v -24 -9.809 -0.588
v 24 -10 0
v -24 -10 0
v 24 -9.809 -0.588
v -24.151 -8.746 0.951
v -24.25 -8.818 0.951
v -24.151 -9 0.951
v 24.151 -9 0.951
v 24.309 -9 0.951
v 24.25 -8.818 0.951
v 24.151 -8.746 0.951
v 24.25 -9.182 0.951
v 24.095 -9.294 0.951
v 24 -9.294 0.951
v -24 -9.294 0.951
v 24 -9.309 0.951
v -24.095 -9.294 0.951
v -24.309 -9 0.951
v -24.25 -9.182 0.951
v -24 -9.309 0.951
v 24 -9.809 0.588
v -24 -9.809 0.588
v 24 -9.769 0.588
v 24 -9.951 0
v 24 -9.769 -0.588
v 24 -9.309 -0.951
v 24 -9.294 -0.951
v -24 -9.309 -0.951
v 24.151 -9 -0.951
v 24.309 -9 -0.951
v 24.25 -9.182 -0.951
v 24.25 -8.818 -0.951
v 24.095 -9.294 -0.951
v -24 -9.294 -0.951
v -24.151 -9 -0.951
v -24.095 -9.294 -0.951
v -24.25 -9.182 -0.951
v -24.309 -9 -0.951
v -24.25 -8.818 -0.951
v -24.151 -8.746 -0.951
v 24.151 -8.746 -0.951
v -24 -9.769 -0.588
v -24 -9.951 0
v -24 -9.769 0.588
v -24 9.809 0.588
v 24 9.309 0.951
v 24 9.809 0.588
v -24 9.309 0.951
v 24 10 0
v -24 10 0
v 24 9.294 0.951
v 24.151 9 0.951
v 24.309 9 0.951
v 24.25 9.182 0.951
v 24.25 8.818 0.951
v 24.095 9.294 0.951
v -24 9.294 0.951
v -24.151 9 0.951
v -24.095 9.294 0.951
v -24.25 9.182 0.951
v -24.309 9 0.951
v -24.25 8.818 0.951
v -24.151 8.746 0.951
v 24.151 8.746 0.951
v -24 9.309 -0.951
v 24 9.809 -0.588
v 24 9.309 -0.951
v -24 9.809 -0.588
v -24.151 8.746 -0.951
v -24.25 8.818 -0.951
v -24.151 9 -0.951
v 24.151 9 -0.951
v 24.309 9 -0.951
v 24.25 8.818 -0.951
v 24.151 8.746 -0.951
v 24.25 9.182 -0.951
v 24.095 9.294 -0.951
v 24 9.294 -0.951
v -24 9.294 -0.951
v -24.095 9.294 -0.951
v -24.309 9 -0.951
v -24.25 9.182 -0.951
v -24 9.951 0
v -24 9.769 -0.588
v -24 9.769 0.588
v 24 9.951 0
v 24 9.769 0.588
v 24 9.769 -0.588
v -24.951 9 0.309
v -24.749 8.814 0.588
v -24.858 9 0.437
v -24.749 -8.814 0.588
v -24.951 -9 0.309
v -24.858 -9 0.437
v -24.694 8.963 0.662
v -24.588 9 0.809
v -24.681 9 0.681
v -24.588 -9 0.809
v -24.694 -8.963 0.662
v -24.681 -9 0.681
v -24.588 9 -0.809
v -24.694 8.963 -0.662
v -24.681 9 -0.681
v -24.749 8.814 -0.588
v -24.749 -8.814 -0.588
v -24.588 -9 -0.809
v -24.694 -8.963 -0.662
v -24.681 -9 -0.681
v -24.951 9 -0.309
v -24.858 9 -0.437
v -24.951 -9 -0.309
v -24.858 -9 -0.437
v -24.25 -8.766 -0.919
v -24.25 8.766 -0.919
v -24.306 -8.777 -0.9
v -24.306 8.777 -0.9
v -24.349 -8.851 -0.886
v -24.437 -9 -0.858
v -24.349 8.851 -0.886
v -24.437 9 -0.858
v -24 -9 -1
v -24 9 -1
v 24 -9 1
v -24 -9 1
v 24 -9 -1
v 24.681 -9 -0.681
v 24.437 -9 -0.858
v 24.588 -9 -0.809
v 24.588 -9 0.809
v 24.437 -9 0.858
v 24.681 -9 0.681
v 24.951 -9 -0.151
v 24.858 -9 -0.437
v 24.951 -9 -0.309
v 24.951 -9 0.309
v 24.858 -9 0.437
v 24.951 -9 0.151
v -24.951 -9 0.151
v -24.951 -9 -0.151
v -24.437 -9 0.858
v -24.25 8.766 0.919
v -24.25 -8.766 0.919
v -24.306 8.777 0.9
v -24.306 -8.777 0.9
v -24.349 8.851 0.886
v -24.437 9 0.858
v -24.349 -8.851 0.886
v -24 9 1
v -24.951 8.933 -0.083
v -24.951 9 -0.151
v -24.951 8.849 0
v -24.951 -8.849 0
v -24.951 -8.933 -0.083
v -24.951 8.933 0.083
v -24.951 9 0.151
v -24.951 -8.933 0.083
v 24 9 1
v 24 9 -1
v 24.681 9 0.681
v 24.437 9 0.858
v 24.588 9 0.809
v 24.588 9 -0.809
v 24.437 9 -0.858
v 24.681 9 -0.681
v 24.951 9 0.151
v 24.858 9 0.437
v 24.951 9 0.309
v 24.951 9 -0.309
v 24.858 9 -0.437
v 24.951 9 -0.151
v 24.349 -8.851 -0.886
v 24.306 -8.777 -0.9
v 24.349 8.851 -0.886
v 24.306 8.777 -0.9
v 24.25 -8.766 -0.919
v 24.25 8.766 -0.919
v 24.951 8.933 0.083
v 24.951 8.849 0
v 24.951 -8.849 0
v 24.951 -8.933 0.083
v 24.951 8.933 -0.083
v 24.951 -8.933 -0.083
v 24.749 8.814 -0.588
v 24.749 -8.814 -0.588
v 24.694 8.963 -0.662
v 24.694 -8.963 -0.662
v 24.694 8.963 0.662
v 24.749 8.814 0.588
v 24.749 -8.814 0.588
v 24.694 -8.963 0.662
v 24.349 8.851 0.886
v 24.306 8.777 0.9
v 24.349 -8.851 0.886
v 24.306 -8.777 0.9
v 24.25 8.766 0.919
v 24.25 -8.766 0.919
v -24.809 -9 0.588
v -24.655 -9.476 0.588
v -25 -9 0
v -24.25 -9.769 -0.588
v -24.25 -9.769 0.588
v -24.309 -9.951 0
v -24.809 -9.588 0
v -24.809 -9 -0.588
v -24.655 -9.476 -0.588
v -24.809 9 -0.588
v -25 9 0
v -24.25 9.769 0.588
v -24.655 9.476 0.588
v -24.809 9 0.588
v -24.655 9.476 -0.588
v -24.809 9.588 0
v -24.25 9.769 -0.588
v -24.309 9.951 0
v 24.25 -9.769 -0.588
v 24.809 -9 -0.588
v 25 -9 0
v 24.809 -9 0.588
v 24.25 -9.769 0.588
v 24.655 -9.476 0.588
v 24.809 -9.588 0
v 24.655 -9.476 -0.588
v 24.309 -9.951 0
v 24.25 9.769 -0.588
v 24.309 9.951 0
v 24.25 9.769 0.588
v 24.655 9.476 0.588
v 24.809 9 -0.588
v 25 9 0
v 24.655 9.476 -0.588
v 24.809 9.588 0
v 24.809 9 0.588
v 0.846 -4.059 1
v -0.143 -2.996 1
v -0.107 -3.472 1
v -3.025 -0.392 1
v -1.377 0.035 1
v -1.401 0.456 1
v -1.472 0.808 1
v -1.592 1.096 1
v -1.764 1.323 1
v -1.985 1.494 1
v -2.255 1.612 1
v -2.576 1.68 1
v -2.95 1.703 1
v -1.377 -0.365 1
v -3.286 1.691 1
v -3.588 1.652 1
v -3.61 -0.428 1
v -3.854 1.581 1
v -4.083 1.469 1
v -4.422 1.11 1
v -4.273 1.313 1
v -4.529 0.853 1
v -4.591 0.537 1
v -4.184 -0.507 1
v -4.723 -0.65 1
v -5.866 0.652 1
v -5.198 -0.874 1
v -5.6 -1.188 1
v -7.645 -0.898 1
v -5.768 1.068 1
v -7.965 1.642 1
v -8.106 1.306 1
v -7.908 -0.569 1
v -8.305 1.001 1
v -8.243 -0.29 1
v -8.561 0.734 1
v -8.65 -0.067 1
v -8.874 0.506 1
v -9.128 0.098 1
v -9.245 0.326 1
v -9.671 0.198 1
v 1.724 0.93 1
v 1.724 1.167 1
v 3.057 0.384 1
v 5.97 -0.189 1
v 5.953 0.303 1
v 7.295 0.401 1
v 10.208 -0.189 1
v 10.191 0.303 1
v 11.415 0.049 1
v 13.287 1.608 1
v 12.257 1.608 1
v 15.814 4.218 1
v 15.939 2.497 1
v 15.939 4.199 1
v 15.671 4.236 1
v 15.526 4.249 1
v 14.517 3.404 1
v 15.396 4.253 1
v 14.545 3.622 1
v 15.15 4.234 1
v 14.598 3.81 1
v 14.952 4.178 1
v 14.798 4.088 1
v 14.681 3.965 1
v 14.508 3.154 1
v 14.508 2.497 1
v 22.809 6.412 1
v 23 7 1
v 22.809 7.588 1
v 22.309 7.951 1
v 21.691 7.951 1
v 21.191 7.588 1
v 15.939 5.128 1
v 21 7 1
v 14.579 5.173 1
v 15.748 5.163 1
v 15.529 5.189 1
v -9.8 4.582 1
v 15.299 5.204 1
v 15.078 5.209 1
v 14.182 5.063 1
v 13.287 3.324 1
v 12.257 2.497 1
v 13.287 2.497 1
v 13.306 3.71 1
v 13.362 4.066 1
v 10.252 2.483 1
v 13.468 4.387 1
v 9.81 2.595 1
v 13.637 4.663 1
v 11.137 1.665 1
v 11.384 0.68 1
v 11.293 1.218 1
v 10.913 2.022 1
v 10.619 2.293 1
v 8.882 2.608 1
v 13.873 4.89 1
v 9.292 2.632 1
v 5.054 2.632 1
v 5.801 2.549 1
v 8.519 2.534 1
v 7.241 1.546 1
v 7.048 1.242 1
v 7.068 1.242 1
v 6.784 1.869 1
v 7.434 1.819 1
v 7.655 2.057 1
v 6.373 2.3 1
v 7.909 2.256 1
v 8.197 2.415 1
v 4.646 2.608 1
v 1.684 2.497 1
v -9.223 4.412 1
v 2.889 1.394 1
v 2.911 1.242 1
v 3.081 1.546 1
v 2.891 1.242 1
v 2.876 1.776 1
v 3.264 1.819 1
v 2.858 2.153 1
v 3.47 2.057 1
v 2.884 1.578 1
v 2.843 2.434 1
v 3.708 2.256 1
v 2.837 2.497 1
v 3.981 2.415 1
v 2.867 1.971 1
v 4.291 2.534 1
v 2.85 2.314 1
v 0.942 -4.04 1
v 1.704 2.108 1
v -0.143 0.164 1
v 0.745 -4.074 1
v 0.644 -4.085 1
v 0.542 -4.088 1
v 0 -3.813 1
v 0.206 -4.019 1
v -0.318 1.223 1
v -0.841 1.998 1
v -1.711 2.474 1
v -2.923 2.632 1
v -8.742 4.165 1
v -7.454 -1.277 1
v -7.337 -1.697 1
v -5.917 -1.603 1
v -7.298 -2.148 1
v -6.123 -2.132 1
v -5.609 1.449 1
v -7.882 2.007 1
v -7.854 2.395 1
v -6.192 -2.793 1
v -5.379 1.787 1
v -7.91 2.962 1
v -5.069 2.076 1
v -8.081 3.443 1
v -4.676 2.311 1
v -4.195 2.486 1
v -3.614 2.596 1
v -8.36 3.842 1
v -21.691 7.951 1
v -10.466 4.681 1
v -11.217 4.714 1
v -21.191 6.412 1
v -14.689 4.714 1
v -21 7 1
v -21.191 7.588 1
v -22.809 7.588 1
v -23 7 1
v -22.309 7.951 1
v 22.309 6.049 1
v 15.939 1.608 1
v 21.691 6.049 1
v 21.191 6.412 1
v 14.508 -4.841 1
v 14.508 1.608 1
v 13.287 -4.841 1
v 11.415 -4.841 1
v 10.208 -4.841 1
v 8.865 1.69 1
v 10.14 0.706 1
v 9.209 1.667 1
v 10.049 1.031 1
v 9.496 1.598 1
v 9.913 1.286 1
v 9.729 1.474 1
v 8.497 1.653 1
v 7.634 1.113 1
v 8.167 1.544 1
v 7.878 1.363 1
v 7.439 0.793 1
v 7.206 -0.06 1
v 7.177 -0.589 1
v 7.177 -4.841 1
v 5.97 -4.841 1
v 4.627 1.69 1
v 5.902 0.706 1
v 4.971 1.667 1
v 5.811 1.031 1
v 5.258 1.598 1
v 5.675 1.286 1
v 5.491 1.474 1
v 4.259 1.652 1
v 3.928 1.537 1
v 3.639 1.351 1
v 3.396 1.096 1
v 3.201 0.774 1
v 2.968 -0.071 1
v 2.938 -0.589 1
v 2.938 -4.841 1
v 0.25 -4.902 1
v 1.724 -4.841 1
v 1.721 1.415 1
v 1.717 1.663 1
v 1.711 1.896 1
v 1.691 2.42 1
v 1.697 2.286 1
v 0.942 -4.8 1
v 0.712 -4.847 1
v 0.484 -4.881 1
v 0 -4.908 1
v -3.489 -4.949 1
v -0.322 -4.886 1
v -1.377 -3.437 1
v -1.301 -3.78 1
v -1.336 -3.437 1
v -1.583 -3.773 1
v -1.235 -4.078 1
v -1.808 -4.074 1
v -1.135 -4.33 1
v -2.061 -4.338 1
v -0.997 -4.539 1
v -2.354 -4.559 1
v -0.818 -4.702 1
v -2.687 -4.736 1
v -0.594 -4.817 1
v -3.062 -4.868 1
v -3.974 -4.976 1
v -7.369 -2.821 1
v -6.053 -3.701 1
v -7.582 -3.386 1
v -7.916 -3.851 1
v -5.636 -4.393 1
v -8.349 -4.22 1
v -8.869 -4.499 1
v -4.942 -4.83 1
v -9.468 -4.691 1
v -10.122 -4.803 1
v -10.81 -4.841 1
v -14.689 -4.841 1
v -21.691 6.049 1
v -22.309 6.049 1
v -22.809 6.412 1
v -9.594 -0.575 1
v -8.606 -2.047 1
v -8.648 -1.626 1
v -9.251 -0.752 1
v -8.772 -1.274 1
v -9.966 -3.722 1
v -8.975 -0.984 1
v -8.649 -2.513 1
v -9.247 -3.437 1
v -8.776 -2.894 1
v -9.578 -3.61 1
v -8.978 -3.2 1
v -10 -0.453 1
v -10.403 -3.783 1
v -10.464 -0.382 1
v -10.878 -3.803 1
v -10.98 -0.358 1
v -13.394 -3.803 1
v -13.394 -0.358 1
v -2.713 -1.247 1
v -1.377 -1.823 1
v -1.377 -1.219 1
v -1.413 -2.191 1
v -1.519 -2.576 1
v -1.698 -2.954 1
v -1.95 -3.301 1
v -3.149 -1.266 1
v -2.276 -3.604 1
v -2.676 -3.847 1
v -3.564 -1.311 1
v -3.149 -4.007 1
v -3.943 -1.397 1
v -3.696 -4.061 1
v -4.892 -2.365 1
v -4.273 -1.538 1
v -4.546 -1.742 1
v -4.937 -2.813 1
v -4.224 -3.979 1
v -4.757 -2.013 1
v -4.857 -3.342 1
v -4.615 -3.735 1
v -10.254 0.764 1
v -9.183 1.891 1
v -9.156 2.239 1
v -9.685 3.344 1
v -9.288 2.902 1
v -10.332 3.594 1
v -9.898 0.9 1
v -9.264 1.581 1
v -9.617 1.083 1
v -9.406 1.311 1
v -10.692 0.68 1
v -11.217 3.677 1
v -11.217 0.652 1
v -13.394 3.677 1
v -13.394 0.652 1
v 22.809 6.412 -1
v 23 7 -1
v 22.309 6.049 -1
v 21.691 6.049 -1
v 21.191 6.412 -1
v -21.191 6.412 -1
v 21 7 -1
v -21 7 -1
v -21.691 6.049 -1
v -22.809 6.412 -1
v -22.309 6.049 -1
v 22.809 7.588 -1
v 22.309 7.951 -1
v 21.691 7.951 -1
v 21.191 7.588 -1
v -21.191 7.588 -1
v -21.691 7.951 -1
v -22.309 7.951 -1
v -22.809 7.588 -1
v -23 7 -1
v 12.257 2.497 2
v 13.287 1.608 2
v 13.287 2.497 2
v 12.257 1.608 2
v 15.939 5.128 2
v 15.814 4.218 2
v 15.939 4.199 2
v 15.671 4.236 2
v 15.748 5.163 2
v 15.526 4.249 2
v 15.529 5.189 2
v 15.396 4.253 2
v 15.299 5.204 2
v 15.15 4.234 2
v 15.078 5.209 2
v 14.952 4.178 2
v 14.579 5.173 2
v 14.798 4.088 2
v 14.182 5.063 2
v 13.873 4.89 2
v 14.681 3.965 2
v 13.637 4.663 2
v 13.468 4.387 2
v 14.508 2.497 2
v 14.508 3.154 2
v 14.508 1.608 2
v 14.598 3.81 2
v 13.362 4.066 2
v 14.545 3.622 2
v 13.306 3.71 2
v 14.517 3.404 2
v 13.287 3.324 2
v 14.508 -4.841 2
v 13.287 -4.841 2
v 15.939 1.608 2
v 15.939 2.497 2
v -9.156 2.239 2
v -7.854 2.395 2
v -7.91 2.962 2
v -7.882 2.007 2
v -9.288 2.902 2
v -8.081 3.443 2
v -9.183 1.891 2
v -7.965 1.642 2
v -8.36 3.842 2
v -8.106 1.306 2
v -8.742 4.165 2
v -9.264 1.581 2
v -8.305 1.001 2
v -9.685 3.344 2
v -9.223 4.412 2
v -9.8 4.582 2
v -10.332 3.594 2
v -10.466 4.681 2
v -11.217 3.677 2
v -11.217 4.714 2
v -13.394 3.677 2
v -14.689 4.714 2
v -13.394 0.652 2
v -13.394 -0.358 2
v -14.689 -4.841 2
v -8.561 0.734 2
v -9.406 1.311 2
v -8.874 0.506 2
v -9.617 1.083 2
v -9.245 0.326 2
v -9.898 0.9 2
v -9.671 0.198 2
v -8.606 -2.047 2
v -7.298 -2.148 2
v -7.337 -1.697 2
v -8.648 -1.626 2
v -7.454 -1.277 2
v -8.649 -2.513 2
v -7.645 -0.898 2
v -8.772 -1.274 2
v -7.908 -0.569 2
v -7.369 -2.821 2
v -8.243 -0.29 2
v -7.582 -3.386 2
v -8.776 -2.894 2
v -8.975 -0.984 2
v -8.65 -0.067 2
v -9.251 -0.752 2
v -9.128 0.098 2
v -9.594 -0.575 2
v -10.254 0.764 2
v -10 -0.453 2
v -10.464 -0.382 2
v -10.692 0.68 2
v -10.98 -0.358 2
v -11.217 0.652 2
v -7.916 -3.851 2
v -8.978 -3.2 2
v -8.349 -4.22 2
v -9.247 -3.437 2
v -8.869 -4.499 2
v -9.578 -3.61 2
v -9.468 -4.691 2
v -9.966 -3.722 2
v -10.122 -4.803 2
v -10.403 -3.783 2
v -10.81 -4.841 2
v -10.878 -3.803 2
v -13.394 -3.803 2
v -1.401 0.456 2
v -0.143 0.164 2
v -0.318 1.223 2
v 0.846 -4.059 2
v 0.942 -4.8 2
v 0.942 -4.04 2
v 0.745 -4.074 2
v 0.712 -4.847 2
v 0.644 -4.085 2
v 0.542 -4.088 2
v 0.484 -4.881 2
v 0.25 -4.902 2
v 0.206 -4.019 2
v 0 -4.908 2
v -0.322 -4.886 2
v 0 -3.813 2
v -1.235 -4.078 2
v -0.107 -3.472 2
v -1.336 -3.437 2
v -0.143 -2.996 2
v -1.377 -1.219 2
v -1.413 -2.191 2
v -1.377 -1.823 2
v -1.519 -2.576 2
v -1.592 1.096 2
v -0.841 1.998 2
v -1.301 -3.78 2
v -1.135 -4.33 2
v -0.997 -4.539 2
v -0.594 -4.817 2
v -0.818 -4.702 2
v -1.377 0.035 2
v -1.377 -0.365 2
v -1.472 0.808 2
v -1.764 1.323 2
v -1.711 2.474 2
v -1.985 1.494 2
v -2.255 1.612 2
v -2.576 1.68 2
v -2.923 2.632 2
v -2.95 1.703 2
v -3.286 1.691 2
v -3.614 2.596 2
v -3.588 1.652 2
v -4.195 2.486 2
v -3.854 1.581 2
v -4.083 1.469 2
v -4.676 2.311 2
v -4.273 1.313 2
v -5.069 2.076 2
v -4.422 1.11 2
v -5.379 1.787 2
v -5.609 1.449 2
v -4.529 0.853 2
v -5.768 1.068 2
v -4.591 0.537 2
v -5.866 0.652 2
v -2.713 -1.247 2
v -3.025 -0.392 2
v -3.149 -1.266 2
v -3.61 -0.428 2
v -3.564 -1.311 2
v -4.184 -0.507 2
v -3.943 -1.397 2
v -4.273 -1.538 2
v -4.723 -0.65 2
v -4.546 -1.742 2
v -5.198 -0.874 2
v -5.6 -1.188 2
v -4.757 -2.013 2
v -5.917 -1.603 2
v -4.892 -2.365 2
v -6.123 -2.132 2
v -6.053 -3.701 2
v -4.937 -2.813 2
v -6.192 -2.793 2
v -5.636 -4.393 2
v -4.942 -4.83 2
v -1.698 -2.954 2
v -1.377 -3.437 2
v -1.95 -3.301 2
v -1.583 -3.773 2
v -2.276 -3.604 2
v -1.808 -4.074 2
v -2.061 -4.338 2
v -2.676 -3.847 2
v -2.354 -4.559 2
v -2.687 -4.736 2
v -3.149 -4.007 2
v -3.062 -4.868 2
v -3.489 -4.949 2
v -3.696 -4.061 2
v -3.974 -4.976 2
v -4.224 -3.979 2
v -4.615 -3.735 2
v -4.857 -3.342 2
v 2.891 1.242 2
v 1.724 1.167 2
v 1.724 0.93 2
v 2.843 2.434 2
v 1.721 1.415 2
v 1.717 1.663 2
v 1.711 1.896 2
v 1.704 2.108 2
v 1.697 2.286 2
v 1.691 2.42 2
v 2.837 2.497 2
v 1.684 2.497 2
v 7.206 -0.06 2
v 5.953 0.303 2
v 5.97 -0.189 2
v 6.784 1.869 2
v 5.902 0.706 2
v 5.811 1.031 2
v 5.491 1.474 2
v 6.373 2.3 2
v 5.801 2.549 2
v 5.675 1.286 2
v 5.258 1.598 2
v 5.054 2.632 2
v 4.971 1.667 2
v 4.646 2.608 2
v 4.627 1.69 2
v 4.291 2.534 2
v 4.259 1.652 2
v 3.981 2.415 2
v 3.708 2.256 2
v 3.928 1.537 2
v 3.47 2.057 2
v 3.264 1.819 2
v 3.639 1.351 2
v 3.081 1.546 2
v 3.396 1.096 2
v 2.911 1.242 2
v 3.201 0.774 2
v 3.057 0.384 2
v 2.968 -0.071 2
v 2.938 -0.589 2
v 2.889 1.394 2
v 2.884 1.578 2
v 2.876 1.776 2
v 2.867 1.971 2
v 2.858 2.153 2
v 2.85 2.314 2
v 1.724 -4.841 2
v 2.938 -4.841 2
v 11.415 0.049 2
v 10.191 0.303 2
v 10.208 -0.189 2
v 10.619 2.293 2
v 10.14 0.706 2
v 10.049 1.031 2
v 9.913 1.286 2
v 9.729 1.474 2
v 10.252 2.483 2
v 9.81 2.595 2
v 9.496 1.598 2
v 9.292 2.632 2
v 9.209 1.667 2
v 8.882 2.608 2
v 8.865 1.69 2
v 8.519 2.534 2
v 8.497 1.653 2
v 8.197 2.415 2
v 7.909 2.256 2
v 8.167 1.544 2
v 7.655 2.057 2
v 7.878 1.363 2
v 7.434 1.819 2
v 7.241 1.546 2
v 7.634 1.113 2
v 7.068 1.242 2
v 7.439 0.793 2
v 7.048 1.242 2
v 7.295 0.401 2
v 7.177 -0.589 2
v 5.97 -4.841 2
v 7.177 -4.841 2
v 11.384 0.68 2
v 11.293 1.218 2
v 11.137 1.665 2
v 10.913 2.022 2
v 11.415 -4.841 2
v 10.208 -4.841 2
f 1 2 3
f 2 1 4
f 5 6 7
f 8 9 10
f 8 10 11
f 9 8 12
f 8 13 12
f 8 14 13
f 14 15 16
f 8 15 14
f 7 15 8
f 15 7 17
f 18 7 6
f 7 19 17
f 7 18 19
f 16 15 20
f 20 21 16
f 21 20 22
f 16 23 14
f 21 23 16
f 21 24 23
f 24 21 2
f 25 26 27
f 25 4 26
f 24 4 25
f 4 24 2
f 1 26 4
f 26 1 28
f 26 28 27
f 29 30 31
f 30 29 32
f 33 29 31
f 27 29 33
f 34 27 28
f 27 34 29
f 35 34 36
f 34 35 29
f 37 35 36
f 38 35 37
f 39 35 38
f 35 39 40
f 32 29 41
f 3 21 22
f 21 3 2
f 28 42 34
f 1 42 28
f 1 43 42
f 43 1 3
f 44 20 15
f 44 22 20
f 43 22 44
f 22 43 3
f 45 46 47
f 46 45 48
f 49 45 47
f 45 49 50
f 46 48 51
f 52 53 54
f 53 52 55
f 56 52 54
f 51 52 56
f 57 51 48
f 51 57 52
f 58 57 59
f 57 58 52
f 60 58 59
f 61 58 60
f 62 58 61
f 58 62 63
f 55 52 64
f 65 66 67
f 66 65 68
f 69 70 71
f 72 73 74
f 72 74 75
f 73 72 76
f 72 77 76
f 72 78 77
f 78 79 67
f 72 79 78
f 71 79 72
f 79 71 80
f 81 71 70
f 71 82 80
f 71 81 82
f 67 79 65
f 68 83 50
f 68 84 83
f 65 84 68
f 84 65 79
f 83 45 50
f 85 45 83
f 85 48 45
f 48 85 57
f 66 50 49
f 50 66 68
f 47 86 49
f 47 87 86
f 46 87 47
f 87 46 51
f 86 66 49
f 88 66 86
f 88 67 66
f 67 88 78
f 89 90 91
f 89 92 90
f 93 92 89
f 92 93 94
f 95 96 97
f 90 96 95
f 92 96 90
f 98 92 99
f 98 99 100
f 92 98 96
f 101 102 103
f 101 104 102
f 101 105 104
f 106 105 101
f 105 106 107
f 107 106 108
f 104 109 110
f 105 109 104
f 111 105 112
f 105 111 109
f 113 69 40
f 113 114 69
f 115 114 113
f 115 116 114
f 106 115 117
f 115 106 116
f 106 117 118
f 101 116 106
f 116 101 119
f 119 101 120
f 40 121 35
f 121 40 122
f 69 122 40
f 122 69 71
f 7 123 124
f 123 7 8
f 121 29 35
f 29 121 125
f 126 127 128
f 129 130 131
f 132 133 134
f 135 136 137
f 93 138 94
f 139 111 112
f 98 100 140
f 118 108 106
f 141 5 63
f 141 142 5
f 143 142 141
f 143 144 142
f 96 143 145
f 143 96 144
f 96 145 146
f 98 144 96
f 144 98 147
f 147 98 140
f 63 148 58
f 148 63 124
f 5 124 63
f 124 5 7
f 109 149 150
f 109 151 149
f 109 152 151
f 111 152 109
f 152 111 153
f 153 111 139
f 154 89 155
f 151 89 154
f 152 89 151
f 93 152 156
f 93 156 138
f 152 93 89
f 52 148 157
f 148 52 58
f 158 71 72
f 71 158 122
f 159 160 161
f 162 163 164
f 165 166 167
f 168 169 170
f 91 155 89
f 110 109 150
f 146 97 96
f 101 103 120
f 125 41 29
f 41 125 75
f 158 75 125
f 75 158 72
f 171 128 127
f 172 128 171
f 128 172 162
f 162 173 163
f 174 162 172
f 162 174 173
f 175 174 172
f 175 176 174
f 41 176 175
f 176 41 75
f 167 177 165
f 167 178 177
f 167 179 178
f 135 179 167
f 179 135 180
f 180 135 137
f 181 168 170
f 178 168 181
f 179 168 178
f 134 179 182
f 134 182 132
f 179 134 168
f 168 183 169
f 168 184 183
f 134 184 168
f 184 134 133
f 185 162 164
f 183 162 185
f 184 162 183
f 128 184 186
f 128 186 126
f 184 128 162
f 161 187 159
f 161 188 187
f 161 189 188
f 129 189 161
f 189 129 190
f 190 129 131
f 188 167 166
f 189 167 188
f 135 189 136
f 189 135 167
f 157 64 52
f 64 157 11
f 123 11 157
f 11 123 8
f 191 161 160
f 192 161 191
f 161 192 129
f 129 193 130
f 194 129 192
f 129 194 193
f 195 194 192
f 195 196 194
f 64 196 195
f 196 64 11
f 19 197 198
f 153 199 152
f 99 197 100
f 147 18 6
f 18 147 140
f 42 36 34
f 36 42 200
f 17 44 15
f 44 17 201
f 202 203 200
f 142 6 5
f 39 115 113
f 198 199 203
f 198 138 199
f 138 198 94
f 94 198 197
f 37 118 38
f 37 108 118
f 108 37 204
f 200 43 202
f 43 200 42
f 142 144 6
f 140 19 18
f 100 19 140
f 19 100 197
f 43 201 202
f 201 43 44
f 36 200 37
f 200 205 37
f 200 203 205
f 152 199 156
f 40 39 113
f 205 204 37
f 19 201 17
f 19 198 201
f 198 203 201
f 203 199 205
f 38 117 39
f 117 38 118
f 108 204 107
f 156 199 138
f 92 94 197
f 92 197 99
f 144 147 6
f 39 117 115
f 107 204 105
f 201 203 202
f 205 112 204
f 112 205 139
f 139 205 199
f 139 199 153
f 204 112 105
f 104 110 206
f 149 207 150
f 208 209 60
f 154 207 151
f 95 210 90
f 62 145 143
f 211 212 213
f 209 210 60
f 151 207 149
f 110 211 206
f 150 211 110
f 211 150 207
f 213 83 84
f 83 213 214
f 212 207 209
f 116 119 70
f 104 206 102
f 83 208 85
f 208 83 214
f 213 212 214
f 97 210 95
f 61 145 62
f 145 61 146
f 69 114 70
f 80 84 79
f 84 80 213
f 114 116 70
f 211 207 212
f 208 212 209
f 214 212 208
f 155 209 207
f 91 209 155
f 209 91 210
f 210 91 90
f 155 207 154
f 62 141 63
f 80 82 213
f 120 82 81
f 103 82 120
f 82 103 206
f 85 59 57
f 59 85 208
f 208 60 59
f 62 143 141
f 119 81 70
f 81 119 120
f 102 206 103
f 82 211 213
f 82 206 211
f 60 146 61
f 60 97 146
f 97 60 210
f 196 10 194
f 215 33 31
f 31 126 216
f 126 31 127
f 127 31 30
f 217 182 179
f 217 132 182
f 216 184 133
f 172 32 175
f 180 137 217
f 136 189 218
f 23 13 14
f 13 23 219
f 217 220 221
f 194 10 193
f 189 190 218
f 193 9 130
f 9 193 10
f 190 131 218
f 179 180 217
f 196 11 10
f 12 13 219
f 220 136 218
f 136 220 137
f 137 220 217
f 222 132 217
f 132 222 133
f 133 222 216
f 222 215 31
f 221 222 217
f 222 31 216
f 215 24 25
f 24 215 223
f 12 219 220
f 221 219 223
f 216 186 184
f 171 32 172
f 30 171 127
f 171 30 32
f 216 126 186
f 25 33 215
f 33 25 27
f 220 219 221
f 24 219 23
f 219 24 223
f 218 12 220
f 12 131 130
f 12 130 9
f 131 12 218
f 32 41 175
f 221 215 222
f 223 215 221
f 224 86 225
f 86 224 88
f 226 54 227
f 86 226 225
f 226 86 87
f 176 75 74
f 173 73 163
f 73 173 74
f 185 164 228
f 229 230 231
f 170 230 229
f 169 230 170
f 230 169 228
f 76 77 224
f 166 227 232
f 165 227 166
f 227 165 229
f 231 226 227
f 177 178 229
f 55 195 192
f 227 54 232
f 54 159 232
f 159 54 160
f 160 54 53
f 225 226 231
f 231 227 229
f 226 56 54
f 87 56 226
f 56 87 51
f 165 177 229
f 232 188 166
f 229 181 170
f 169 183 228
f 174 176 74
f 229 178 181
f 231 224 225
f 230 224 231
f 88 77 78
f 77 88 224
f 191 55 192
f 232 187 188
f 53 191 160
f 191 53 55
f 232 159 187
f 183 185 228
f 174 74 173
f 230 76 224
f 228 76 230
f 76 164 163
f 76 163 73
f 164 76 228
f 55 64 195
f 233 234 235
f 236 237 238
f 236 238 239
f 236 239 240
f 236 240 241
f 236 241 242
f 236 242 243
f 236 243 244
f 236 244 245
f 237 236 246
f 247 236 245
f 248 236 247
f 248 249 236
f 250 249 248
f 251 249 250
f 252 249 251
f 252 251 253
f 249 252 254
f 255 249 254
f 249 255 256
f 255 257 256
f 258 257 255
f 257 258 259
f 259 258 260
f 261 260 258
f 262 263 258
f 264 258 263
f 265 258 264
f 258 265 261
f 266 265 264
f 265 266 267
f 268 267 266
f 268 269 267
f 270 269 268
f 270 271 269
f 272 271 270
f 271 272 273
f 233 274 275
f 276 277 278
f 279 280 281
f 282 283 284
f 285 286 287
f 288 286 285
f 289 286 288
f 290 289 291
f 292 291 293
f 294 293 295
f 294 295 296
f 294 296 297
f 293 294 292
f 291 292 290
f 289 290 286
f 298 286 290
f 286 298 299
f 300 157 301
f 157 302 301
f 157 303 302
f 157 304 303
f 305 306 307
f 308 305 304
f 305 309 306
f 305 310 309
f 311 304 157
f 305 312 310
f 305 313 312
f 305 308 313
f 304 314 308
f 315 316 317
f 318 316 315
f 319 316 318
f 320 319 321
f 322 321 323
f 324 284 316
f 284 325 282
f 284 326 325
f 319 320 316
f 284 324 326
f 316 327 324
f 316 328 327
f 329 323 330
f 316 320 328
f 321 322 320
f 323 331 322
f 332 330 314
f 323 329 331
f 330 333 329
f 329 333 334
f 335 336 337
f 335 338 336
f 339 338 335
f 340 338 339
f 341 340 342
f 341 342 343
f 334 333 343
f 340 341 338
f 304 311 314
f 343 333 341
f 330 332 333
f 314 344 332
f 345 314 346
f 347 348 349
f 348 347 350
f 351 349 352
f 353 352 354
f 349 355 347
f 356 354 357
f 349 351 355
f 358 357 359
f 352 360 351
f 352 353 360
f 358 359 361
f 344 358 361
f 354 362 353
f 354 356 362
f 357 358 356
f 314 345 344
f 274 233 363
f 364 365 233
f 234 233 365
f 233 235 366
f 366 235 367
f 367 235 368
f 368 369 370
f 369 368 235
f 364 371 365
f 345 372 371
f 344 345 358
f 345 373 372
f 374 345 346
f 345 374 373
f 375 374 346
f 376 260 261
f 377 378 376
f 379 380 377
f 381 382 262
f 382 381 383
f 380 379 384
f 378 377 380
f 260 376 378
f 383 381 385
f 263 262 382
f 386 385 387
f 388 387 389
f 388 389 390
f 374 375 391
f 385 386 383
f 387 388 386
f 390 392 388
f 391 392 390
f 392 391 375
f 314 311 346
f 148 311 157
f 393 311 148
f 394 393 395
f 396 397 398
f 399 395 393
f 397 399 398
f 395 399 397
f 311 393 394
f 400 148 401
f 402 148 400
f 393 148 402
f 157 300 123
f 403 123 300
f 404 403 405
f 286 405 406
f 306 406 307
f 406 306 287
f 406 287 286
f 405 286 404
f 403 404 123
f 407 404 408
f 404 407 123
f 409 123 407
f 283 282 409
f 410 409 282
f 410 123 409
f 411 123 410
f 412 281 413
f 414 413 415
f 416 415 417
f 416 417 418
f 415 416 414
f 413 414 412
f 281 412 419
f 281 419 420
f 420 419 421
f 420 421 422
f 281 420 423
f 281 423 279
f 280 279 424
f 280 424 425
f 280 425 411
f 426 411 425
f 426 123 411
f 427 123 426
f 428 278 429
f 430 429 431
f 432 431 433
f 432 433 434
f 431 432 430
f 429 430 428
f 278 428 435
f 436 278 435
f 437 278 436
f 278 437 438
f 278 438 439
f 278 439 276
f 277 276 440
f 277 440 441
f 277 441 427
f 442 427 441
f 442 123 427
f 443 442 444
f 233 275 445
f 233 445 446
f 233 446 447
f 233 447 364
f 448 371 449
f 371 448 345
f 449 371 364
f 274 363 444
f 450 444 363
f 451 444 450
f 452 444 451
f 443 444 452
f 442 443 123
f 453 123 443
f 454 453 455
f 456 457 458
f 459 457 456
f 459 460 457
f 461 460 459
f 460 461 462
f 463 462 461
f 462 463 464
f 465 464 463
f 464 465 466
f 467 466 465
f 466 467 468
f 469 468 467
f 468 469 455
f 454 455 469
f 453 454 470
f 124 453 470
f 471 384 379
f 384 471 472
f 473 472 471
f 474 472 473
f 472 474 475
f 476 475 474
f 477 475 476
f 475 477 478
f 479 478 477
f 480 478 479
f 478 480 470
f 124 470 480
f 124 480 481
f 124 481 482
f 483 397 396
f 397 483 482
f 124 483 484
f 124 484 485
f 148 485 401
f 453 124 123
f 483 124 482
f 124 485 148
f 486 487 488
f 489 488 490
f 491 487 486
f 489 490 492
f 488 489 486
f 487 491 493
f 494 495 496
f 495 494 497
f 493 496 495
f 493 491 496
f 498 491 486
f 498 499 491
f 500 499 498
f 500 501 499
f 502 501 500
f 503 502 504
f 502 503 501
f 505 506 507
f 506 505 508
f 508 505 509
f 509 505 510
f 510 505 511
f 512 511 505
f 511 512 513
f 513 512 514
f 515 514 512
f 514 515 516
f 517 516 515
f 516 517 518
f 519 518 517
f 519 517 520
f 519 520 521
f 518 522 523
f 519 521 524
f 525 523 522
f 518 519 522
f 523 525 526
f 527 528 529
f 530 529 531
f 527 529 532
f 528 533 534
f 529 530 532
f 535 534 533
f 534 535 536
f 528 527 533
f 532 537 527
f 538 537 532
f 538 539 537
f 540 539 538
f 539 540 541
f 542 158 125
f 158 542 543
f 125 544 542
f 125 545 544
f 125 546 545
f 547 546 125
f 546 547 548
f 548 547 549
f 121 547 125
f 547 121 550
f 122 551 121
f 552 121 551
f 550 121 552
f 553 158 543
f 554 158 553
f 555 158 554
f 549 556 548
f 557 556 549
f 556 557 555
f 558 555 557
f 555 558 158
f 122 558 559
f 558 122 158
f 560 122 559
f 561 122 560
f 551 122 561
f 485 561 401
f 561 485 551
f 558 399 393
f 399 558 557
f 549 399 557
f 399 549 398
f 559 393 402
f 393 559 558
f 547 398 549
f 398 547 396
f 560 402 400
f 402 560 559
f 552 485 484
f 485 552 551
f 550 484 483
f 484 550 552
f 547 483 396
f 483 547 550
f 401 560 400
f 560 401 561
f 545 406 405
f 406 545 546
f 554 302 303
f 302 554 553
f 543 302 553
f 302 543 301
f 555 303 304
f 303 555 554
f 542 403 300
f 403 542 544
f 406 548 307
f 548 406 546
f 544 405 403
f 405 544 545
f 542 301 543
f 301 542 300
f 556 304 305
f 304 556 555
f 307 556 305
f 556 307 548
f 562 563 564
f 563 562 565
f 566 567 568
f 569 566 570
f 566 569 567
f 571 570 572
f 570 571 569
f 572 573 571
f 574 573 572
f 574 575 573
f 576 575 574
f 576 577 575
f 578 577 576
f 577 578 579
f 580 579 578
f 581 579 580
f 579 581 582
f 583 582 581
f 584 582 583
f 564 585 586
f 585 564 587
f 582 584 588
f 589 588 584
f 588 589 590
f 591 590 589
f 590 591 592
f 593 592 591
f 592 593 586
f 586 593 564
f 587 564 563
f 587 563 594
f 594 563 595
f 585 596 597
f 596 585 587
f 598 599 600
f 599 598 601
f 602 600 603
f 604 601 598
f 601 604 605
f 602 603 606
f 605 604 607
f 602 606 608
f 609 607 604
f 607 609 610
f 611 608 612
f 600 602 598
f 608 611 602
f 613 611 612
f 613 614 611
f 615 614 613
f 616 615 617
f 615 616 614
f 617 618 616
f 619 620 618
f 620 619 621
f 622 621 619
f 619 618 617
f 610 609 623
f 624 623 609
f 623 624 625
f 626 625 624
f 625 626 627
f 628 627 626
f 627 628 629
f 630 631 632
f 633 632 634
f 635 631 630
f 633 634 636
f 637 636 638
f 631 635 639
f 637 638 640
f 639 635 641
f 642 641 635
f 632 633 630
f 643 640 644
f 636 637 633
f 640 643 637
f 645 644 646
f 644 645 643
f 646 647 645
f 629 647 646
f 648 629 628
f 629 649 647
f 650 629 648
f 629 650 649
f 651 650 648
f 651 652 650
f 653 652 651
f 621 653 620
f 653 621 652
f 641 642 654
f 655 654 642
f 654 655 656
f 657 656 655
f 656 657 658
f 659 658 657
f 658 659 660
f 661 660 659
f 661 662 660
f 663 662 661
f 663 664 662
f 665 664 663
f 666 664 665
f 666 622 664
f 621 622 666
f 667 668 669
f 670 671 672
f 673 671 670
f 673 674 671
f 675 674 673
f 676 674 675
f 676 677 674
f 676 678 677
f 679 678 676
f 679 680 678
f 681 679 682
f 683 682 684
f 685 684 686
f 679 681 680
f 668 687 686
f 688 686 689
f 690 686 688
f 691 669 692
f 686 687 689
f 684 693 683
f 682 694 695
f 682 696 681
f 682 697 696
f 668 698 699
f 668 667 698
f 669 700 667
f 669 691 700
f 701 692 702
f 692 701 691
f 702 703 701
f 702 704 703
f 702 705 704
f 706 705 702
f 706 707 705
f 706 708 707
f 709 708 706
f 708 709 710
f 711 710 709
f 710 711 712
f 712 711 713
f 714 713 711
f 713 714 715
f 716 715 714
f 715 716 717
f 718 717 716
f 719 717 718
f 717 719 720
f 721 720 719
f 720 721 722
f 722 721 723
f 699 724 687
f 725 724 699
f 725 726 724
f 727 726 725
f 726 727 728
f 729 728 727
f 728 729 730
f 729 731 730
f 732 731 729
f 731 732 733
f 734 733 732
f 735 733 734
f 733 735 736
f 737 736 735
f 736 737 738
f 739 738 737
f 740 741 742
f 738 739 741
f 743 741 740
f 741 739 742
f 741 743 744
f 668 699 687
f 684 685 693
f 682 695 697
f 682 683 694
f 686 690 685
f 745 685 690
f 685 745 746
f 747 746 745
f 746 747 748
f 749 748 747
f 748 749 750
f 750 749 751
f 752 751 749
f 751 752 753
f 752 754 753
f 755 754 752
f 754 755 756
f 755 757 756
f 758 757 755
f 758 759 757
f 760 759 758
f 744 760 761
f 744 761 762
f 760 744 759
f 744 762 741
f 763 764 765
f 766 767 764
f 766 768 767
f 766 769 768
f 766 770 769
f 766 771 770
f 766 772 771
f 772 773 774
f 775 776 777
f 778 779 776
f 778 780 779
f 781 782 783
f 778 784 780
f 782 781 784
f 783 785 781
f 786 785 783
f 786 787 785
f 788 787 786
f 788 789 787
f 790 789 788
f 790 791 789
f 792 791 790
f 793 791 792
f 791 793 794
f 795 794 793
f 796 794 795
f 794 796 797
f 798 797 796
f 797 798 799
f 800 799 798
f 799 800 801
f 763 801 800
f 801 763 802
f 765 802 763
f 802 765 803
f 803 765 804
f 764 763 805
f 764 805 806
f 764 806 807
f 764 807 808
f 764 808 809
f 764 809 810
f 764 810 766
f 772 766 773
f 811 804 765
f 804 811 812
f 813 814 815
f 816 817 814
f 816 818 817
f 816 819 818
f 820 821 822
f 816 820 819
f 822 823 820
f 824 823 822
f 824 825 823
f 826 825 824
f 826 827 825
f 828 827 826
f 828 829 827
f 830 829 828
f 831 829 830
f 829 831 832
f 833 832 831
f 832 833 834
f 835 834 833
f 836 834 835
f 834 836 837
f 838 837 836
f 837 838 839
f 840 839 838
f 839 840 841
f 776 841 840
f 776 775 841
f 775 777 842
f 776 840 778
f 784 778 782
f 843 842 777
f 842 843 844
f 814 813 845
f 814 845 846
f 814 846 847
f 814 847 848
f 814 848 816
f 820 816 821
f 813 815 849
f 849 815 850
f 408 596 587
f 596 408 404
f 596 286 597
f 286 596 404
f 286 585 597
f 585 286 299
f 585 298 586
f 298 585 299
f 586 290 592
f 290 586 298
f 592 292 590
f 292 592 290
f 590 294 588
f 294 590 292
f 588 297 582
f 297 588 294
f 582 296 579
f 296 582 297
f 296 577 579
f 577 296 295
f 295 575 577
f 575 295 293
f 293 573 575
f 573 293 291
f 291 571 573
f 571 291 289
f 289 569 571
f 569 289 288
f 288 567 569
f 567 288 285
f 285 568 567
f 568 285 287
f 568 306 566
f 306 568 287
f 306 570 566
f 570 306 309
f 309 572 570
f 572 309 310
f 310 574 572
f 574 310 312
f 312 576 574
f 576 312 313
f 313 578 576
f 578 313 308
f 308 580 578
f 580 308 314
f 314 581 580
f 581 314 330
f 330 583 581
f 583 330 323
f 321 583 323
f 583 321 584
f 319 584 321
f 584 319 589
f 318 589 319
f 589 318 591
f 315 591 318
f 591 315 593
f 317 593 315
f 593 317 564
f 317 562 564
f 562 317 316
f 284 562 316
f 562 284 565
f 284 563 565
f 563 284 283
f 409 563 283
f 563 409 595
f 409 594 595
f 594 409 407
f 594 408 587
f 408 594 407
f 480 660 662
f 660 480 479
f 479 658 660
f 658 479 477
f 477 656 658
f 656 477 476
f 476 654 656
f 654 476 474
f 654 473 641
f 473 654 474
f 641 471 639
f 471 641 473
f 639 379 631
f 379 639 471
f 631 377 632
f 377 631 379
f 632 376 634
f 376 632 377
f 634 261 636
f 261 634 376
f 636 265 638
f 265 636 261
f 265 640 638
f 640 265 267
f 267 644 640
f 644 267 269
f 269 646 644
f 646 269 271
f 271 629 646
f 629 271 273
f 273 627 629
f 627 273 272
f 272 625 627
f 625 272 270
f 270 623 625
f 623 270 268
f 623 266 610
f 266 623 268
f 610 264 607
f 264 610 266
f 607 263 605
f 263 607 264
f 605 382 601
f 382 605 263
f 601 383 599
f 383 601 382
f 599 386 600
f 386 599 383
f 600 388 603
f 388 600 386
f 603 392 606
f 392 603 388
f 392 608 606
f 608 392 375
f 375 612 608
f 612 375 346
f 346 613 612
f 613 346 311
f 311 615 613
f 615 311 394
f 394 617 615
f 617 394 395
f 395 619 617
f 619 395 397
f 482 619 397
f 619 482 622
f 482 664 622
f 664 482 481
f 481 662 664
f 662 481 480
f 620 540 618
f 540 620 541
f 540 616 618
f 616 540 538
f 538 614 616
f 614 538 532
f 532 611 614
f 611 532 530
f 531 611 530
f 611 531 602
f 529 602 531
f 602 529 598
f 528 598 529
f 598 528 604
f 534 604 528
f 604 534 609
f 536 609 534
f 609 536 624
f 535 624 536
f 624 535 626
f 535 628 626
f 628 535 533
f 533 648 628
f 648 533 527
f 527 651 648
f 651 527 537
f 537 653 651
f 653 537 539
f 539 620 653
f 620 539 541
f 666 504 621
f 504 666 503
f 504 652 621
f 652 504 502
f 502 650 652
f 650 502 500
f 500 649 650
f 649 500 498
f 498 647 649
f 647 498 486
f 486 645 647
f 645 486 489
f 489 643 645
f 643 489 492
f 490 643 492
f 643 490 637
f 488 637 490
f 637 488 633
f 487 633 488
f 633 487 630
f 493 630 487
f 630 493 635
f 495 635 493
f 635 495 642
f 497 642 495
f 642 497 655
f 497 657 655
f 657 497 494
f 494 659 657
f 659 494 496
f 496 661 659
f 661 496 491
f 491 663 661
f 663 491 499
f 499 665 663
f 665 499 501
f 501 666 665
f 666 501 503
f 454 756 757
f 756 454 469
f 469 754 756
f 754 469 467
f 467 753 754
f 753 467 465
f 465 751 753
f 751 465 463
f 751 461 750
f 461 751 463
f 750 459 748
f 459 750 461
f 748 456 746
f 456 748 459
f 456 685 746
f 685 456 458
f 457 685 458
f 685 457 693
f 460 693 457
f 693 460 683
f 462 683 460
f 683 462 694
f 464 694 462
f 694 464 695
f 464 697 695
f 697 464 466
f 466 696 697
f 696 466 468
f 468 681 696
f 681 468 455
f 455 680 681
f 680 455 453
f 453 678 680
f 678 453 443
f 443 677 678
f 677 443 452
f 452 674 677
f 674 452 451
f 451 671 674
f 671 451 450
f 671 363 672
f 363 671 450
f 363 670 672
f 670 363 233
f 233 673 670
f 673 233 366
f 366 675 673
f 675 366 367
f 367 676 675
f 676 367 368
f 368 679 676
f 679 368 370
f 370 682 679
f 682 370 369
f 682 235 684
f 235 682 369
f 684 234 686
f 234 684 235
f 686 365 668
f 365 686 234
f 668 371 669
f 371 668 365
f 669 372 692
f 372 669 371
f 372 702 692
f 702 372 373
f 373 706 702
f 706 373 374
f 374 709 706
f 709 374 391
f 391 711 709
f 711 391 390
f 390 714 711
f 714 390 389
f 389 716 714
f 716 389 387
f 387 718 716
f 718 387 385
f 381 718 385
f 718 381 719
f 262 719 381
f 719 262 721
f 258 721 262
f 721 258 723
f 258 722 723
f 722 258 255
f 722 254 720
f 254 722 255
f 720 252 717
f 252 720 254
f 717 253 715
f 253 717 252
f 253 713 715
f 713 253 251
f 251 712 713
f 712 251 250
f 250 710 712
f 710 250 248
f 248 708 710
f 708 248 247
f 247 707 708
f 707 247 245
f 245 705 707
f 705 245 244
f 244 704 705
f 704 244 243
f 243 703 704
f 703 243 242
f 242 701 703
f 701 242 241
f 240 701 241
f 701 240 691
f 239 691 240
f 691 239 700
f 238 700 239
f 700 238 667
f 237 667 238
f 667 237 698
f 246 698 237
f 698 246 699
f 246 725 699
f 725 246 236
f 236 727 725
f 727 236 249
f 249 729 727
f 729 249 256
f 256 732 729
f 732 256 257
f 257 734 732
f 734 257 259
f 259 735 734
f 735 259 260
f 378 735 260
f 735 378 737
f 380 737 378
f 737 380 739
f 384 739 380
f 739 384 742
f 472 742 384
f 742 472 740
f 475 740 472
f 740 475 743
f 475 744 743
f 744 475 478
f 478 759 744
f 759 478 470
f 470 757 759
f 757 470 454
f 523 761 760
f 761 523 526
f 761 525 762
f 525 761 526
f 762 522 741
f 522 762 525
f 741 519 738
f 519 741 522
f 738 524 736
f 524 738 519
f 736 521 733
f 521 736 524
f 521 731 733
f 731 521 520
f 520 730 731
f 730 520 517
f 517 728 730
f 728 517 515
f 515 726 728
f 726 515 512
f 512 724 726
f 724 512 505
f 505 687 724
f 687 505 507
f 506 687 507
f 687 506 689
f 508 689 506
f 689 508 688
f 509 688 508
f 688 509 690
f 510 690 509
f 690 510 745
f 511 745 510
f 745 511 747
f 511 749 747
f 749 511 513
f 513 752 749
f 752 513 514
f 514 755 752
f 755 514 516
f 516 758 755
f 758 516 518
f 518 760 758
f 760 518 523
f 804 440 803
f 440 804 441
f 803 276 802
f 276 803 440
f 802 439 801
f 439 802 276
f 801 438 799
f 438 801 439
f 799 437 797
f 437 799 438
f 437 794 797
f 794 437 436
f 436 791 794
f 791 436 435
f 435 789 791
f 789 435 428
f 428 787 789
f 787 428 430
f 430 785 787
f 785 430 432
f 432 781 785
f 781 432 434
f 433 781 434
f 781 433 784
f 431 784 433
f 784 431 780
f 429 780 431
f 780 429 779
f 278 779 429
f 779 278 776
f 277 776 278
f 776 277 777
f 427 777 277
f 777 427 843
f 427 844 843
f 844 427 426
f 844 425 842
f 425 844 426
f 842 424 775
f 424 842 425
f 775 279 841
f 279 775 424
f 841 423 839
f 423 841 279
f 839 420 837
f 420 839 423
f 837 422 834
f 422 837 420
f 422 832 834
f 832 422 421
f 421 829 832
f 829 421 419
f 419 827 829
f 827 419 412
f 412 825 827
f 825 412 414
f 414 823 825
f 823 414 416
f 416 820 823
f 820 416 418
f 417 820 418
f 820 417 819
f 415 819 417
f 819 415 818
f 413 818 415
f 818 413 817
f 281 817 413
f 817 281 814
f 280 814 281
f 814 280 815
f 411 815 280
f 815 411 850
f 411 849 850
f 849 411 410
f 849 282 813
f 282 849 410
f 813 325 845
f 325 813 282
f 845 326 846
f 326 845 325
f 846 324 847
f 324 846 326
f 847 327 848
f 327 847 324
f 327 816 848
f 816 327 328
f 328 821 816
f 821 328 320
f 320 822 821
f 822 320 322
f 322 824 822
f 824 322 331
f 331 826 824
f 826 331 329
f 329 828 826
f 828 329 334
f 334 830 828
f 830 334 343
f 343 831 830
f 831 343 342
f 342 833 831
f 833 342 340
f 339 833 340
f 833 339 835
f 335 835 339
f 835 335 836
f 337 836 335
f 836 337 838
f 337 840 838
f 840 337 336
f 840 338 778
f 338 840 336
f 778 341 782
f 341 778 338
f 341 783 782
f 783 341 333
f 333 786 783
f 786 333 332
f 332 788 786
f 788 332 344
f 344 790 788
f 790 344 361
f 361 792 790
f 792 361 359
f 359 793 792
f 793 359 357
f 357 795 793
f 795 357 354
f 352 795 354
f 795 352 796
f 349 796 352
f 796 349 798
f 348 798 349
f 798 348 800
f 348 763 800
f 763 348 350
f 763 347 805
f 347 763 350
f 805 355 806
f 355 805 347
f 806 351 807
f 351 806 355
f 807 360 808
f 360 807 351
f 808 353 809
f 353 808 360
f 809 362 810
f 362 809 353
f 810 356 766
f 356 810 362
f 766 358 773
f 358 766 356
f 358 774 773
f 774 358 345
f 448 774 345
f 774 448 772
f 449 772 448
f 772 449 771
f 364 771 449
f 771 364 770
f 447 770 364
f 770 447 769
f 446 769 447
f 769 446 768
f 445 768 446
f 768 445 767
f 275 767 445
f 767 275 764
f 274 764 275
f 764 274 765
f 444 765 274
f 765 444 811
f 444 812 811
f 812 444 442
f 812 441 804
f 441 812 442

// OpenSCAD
include <MCAD/boxes.scad>

/* [Plate] */
length = 50;
width = 20;
thickness = 2;
hole_size = 2;
plate_color = "blue"; // [green, yellow, blue, red, silver, black]

/* [Text] */
text_string = "Bamf";
text_font = "Liberation Sans"; // [Liberation Mono, Liberation Sans, Liberation Sans Narrow, Liberation Serif]
text_color = "green"; // [green, yellow, blue, red, silver, black]
text_thickness = 1;

/* [Hidden] */
$fn = 10;
thickness_translate = thickness / 2;

module plate()
{
color(plate_color) roundedBox([length,width,thickness], 1);
}

module holes()
{
    translate([-(length / 2) + 3, (width / 2) - 3,-thickness_translate]) cylinder(thickness, hole_size / 2);
translate([(length / 2) - 3, (width / 2) - 3,-thickness_translate]) cylinder(thickness,hole_size / 2);
}

module letters()
{
        translate([0,0, thickness_translate]) color(text_color) linear_extrude(text_thickness) 
text(text_string, halign="center", valign = "center", font = text_font);
}

union()
{
    difference()
    {
        plate();
        holes();
    }
    
    letters();
}
